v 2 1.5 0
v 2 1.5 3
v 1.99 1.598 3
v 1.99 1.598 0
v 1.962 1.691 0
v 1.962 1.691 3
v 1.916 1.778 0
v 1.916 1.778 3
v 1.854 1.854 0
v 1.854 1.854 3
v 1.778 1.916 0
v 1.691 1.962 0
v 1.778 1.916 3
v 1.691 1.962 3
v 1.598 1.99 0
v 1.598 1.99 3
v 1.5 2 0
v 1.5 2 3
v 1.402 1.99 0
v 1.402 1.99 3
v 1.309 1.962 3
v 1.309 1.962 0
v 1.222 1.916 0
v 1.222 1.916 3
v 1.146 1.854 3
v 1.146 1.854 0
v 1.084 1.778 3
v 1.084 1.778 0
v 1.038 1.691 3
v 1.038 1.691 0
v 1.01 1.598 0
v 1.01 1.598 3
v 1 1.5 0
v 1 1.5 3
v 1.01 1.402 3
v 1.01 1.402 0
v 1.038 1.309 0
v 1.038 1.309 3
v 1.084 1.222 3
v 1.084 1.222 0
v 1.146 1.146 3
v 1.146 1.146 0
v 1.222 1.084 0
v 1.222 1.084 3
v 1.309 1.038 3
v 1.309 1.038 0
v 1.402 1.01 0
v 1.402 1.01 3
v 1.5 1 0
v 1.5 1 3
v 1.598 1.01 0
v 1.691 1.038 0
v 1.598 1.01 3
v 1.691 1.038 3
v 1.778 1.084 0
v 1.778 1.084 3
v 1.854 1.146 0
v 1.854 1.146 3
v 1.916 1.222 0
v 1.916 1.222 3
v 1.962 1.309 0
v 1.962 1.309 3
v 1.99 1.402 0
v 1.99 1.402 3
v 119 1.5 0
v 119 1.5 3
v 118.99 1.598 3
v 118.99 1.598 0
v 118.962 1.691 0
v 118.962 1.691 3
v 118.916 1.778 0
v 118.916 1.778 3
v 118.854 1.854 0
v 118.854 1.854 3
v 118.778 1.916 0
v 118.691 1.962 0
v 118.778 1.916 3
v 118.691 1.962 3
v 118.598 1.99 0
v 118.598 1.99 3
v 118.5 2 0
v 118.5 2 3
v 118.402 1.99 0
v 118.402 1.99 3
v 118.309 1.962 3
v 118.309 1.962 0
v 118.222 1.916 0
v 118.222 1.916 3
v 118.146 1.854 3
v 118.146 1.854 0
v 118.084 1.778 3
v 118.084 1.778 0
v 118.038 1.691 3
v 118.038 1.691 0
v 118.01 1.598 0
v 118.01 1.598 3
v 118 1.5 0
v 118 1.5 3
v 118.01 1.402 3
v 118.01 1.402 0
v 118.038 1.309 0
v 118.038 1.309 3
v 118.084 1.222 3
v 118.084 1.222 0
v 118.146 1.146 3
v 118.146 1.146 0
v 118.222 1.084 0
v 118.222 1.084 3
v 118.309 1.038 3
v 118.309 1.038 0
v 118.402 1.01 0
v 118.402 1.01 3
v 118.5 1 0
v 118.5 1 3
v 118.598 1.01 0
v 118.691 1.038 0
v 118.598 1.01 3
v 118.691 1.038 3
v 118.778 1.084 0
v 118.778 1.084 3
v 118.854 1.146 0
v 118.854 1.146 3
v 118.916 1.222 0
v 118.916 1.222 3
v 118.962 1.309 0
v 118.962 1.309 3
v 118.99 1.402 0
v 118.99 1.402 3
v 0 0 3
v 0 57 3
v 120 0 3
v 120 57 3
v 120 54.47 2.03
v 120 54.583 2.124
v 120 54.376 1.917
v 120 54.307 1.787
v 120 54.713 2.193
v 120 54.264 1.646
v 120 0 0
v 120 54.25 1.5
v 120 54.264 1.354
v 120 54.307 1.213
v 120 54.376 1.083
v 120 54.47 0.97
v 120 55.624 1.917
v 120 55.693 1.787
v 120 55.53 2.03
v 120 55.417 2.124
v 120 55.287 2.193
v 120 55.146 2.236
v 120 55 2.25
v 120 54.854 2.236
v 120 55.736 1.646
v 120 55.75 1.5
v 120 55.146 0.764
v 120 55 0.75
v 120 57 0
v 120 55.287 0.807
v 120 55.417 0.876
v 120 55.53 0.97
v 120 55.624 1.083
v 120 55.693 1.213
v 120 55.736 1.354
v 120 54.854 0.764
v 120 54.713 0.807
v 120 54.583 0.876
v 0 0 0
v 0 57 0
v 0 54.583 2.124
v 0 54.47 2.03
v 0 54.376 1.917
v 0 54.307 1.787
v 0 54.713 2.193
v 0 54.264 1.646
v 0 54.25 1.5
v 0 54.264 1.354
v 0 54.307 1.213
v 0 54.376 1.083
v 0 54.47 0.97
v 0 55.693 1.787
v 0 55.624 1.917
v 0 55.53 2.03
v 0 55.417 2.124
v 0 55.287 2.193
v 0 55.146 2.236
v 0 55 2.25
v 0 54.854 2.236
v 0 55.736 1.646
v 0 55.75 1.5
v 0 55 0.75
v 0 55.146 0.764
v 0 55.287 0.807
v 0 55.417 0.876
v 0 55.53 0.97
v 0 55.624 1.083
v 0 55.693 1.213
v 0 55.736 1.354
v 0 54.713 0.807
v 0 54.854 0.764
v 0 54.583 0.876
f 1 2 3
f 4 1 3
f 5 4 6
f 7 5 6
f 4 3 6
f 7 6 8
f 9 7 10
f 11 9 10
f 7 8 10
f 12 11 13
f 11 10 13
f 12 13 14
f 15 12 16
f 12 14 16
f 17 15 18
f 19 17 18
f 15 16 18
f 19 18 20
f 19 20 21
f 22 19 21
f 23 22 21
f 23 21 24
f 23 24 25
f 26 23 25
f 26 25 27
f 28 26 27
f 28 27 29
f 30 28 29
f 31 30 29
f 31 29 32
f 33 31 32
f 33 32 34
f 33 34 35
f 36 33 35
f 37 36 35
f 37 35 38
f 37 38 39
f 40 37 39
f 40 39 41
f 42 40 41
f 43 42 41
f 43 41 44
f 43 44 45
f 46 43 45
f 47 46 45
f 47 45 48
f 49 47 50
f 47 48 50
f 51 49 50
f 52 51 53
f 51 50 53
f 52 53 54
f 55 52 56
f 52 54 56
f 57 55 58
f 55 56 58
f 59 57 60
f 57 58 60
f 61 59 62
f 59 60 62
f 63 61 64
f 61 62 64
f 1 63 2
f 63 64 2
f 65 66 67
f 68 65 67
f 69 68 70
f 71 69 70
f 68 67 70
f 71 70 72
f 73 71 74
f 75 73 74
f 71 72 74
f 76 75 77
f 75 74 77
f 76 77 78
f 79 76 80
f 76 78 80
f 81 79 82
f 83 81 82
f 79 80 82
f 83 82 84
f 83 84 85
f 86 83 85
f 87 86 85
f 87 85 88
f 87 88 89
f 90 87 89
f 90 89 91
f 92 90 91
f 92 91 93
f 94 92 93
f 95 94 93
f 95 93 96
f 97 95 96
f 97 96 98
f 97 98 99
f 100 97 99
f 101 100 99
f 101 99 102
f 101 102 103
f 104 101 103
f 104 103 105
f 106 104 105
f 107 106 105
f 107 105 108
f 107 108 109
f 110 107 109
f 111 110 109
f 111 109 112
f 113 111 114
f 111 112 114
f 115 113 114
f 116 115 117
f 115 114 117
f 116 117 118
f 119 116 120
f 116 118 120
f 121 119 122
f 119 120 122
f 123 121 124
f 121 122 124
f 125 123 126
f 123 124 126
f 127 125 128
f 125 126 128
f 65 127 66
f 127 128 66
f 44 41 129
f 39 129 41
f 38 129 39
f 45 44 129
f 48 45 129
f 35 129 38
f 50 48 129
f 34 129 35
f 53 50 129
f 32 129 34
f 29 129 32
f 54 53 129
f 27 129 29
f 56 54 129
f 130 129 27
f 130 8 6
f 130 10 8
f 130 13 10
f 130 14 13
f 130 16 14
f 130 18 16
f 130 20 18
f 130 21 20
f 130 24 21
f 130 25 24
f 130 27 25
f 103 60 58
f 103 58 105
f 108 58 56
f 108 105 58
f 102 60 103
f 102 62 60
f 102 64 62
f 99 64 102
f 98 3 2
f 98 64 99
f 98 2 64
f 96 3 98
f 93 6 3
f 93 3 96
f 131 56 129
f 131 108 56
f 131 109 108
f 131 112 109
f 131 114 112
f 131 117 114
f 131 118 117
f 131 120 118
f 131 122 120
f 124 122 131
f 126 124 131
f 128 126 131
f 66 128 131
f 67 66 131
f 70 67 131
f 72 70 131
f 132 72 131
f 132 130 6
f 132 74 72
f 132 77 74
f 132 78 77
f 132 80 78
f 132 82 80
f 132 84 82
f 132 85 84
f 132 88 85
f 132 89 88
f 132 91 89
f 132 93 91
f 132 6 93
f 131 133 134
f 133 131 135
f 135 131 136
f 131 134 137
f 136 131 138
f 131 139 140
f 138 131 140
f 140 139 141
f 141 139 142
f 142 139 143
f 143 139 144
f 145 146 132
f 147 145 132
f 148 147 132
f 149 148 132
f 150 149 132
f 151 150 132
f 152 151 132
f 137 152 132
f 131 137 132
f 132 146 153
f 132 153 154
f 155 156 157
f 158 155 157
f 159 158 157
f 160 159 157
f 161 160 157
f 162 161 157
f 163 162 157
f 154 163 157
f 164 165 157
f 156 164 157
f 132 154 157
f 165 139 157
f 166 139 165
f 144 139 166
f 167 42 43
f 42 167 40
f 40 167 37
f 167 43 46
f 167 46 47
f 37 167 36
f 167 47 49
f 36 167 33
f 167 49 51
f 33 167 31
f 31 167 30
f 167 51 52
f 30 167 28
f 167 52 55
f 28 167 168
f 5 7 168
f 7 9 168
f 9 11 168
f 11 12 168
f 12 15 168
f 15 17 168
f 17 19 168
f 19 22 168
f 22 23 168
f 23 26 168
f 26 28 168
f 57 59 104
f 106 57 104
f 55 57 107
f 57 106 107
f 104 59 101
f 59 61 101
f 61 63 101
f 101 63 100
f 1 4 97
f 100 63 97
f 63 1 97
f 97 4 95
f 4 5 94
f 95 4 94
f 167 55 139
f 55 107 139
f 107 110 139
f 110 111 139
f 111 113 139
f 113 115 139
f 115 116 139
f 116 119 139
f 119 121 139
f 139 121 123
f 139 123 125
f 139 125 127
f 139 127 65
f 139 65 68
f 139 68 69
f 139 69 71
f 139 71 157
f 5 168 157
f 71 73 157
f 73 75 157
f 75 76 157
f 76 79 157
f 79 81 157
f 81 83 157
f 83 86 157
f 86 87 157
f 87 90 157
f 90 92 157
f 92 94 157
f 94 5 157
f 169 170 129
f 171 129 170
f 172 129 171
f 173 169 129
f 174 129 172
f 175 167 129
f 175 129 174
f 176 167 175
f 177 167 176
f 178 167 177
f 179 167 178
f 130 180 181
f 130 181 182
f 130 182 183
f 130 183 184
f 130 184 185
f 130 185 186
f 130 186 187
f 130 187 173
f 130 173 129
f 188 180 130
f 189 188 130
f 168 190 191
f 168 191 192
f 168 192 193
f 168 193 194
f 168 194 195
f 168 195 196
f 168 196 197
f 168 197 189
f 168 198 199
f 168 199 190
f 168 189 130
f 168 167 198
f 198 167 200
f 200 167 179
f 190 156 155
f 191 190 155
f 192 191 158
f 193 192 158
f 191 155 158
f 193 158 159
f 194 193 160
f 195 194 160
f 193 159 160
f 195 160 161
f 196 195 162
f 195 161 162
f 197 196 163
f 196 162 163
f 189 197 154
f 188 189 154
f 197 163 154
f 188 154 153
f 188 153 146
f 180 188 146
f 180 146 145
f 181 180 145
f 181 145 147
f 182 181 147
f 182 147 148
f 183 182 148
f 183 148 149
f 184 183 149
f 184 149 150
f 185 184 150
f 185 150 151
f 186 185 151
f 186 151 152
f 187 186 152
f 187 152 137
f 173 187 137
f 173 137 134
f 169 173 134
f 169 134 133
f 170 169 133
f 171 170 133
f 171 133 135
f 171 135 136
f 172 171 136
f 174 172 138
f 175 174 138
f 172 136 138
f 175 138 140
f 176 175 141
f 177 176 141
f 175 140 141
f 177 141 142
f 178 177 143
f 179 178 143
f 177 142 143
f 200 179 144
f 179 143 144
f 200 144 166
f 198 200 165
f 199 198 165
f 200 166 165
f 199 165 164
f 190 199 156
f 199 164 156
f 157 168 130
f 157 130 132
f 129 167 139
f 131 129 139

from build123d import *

# Parameters (mm, degrees)
SKETCH_1_W          = 120
SKETCH_1_H          = 57
EXTRUDE_1_DEPTH     = 3
SKETCH_2_R          = 0.75
CUT_EXTRUDE_1_DEPTH = 124
SKETCH_3_R          = 0.5
CUT_EXTRUDE_2_DEPTH = 10


with BuildPart() as part:
    # 草图1 → 凸台-拉伸1 (new body)
    with BuildSketch(Plane.XY):
        with Locations((60, 28.5)):
            Rectangle(SKETCH_1_W, SKETCH_1_H)
    extrude(amount=EXTRUDE_1_DEPTH)

    # 草图2 → 切除-拉伸1 (cut)
    with BuildSketch(Plane(origin=(120, 0, 0), x_dir=(0, 0, -1), z_dir=(1, 0, 0))):
        with Locations((-1.5, 55)):
            Circle(SKETCH_2_R)
    extrude(amount=-CUT_EXTRUDE_1_DEPTH, mode=Mode.SUBTRACT)

    # 草图3 → 切除-拉伸2 (cut)
    with BuildSketch(Plane.XY.offset(3)):
        with Locations((1.5, 1.5)):
            Circle(SKETCH_3_R)
        with Locations((118.5, 1.5)):
            Circle(SKETCH_3_R)
    extrude(amount=-CUT_EXTRUDE_2_DEPTH, mode=Mode.SUBTRACT)


solid = part.part
